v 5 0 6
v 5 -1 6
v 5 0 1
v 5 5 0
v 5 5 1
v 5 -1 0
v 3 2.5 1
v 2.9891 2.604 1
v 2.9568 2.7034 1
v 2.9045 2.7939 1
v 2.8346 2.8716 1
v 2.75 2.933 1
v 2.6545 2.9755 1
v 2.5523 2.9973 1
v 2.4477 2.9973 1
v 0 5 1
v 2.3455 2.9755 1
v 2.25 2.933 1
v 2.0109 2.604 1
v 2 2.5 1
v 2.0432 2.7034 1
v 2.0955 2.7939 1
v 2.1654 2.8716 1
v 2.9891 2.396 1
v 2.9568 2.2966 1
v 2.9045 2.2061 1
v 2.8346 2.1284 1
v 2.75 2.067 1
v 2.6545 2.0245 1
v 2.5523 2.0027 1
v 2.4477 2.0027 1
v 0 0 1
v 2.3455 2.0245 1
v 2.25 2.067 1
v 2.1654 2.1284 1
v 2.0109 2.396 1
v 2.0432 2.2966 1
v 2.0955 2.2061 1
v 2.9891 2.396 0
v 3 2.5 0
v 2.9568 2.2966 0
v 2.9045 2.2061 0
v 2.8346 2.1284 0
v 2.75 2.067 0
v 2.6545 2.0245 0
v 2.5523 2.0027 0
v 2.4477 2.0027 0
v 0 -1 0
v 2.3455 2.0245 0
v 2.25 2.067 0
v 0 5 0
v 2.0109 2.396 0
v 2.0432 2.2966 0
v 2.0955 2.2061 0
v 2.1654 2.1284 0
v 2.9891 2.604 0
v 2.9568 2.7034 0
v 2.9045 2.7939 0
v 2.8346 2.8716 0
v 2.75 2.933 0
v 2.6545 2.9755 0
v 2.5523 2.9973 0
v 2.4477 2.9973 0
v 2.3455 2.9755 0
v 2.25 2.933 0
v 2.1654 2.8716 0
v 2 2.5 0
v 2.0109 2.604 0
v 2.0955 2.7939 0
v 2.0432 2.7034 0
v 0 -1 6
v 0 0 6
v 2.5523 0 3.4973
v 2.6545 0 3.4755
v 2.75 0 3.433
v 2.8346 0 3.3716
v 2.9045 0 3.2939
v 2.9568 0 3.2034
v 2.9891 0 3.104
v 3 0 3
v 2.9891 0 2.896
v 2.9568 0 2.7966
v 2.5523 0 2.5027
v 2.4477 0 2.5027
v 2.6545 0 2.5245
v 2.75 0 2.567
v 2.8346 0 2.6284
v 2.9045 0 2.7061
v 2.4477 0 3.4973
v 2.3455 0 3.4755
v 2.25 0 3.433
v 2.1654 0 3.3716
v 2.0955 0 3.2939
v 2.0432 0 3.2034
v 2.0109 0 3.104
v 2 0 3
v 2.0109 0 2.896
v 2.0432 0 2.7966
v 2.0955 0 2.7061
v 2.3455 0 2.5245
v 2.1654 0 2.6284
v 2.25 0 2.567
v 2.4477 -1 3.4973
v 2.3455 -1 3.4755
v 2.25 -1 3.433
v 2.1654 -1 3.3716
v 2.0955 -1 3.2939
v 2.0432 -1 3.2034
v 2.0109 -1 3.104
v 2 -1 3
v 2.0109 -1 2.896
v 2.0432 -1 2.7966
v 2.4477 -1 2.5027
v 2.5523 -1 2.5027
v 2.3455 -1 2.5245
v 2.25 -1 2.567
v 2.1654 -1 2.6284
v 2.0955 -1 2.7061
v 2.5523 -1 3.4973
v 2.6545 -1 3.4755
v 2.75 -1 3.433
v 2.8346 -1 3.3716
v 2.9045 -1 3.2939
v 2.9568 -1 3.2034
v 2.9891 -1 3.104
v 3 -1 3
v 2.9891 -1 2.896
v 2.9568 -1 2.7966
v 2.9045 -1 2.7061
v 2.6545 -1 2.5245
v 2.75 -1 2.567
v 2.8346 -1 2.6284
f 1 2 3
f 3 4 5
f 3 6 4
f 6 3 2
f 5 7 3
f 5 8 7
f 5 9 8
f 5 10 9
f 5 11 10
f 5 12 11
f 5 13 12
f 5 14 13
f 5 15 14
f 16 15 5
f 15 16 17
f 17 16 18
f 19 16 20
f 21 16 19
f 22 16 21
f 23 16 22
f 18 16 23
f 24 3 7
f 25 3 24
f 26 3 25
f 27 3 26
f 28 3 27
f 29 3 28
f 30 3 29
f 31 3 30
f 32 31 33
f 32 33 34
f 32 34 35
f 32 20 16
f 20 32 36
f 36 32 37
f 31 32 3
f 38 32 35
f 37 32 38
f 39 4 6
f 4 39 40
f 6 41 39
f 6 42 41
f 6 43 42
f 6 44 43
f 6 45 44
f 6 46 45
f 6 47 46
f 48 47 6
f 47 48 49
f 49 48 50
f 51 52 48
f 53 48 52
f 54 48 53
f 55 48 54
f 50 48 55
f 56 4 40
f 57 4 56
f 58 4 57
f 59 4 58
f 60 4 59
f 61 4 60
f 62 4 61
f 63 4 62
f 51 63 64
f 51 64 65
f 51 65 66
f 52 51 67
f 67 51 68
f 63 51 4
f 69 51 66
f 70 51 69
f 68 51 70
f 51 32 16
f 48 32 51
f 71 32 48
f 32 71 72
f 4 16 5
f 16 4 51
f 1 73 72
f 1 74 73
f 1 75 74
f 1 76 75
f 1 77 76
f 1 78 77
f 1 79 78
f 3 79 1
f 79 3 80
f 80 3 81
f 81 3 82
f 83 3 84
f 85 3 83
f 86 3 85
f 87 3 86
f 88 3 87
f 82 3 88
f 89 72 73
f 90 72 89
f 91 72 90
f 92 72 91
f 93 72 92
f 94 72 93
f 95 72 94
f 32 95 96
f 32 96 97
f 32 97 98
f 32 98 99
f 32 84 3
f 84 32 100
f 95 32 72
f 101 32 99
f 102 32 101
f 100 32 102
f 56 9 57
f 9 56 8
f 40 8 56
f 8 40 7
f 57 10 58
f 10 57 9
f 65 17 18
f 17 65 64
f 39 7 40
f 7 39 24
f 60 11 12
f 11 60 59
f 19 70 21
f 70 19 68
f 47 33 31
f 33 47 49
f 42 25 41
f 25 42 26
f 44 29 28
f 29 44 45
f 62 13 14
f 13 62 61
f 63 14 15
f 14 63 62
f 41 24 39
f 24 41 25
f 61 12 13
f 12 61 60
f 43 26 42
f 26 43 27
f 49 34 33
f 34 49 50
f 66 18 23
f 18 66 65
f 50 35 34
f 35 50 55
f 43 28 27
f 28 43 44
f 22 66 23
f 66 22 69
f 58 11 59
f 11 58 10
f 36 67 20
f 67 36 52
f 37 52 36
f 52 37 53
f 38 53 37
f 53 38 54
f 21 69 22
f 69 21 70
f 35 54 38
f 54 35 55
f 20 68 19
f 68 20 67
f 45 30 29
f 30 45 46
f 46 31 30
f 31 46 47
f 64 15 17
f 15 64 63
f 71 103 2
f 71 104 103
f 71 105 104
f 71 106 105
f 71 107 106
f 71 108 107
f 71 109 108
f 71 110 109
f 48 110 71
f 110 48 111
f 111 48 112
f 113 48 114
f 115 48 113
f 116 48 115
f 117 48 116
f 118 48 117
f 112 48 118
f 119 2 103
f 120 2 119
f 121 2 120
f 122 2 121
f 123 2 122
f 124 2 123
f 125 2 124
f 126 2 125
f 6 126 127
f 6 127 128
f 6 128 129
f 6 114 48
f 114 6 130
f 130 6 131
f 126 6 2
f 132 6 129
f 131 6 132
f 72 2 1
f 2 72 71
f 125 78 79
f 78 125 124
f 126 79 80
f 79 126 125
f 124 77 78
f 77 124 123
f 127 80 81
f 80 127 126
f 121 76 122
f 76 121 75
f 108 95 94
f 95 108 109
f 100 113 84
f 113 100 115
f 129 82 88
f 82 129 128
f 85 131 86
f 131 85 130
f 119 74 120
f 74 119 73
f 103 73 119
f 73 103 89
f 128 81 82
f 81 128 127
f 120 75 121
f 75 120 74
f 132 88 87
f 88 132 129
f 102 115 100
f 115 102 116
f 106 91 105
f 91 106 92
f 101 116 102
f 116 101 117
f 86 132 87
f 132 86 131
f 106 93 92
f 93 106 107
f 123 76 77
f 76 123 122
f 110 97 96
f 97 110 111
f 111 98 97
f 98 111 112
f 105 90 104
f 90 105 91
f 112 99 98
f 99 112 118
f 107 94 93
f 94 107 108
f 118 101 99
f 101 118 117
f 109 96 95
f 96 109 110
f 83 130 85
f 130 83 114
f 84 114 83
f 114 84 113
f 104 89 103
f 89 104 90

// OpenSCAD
// Followed David Dobervich's video in YouTube. https://www.youtube.com/watch?v=6gBMm6r28vM

$fn=30;

module plate(length, width, thickness) {
    difference() {
        cube([length,width,thickness]);

        translate([length/2,width/2,0]) {
            cylinder(r=0.5, h=1, $fn=30);
        }
    }
}

module bracket(length, width, thickness) {

    plate(length,width,thickness);
    rotate(a=90, v=[1,0,0]) {plate(length,width+1,thickness); }
}

bracket(5,5,1);
